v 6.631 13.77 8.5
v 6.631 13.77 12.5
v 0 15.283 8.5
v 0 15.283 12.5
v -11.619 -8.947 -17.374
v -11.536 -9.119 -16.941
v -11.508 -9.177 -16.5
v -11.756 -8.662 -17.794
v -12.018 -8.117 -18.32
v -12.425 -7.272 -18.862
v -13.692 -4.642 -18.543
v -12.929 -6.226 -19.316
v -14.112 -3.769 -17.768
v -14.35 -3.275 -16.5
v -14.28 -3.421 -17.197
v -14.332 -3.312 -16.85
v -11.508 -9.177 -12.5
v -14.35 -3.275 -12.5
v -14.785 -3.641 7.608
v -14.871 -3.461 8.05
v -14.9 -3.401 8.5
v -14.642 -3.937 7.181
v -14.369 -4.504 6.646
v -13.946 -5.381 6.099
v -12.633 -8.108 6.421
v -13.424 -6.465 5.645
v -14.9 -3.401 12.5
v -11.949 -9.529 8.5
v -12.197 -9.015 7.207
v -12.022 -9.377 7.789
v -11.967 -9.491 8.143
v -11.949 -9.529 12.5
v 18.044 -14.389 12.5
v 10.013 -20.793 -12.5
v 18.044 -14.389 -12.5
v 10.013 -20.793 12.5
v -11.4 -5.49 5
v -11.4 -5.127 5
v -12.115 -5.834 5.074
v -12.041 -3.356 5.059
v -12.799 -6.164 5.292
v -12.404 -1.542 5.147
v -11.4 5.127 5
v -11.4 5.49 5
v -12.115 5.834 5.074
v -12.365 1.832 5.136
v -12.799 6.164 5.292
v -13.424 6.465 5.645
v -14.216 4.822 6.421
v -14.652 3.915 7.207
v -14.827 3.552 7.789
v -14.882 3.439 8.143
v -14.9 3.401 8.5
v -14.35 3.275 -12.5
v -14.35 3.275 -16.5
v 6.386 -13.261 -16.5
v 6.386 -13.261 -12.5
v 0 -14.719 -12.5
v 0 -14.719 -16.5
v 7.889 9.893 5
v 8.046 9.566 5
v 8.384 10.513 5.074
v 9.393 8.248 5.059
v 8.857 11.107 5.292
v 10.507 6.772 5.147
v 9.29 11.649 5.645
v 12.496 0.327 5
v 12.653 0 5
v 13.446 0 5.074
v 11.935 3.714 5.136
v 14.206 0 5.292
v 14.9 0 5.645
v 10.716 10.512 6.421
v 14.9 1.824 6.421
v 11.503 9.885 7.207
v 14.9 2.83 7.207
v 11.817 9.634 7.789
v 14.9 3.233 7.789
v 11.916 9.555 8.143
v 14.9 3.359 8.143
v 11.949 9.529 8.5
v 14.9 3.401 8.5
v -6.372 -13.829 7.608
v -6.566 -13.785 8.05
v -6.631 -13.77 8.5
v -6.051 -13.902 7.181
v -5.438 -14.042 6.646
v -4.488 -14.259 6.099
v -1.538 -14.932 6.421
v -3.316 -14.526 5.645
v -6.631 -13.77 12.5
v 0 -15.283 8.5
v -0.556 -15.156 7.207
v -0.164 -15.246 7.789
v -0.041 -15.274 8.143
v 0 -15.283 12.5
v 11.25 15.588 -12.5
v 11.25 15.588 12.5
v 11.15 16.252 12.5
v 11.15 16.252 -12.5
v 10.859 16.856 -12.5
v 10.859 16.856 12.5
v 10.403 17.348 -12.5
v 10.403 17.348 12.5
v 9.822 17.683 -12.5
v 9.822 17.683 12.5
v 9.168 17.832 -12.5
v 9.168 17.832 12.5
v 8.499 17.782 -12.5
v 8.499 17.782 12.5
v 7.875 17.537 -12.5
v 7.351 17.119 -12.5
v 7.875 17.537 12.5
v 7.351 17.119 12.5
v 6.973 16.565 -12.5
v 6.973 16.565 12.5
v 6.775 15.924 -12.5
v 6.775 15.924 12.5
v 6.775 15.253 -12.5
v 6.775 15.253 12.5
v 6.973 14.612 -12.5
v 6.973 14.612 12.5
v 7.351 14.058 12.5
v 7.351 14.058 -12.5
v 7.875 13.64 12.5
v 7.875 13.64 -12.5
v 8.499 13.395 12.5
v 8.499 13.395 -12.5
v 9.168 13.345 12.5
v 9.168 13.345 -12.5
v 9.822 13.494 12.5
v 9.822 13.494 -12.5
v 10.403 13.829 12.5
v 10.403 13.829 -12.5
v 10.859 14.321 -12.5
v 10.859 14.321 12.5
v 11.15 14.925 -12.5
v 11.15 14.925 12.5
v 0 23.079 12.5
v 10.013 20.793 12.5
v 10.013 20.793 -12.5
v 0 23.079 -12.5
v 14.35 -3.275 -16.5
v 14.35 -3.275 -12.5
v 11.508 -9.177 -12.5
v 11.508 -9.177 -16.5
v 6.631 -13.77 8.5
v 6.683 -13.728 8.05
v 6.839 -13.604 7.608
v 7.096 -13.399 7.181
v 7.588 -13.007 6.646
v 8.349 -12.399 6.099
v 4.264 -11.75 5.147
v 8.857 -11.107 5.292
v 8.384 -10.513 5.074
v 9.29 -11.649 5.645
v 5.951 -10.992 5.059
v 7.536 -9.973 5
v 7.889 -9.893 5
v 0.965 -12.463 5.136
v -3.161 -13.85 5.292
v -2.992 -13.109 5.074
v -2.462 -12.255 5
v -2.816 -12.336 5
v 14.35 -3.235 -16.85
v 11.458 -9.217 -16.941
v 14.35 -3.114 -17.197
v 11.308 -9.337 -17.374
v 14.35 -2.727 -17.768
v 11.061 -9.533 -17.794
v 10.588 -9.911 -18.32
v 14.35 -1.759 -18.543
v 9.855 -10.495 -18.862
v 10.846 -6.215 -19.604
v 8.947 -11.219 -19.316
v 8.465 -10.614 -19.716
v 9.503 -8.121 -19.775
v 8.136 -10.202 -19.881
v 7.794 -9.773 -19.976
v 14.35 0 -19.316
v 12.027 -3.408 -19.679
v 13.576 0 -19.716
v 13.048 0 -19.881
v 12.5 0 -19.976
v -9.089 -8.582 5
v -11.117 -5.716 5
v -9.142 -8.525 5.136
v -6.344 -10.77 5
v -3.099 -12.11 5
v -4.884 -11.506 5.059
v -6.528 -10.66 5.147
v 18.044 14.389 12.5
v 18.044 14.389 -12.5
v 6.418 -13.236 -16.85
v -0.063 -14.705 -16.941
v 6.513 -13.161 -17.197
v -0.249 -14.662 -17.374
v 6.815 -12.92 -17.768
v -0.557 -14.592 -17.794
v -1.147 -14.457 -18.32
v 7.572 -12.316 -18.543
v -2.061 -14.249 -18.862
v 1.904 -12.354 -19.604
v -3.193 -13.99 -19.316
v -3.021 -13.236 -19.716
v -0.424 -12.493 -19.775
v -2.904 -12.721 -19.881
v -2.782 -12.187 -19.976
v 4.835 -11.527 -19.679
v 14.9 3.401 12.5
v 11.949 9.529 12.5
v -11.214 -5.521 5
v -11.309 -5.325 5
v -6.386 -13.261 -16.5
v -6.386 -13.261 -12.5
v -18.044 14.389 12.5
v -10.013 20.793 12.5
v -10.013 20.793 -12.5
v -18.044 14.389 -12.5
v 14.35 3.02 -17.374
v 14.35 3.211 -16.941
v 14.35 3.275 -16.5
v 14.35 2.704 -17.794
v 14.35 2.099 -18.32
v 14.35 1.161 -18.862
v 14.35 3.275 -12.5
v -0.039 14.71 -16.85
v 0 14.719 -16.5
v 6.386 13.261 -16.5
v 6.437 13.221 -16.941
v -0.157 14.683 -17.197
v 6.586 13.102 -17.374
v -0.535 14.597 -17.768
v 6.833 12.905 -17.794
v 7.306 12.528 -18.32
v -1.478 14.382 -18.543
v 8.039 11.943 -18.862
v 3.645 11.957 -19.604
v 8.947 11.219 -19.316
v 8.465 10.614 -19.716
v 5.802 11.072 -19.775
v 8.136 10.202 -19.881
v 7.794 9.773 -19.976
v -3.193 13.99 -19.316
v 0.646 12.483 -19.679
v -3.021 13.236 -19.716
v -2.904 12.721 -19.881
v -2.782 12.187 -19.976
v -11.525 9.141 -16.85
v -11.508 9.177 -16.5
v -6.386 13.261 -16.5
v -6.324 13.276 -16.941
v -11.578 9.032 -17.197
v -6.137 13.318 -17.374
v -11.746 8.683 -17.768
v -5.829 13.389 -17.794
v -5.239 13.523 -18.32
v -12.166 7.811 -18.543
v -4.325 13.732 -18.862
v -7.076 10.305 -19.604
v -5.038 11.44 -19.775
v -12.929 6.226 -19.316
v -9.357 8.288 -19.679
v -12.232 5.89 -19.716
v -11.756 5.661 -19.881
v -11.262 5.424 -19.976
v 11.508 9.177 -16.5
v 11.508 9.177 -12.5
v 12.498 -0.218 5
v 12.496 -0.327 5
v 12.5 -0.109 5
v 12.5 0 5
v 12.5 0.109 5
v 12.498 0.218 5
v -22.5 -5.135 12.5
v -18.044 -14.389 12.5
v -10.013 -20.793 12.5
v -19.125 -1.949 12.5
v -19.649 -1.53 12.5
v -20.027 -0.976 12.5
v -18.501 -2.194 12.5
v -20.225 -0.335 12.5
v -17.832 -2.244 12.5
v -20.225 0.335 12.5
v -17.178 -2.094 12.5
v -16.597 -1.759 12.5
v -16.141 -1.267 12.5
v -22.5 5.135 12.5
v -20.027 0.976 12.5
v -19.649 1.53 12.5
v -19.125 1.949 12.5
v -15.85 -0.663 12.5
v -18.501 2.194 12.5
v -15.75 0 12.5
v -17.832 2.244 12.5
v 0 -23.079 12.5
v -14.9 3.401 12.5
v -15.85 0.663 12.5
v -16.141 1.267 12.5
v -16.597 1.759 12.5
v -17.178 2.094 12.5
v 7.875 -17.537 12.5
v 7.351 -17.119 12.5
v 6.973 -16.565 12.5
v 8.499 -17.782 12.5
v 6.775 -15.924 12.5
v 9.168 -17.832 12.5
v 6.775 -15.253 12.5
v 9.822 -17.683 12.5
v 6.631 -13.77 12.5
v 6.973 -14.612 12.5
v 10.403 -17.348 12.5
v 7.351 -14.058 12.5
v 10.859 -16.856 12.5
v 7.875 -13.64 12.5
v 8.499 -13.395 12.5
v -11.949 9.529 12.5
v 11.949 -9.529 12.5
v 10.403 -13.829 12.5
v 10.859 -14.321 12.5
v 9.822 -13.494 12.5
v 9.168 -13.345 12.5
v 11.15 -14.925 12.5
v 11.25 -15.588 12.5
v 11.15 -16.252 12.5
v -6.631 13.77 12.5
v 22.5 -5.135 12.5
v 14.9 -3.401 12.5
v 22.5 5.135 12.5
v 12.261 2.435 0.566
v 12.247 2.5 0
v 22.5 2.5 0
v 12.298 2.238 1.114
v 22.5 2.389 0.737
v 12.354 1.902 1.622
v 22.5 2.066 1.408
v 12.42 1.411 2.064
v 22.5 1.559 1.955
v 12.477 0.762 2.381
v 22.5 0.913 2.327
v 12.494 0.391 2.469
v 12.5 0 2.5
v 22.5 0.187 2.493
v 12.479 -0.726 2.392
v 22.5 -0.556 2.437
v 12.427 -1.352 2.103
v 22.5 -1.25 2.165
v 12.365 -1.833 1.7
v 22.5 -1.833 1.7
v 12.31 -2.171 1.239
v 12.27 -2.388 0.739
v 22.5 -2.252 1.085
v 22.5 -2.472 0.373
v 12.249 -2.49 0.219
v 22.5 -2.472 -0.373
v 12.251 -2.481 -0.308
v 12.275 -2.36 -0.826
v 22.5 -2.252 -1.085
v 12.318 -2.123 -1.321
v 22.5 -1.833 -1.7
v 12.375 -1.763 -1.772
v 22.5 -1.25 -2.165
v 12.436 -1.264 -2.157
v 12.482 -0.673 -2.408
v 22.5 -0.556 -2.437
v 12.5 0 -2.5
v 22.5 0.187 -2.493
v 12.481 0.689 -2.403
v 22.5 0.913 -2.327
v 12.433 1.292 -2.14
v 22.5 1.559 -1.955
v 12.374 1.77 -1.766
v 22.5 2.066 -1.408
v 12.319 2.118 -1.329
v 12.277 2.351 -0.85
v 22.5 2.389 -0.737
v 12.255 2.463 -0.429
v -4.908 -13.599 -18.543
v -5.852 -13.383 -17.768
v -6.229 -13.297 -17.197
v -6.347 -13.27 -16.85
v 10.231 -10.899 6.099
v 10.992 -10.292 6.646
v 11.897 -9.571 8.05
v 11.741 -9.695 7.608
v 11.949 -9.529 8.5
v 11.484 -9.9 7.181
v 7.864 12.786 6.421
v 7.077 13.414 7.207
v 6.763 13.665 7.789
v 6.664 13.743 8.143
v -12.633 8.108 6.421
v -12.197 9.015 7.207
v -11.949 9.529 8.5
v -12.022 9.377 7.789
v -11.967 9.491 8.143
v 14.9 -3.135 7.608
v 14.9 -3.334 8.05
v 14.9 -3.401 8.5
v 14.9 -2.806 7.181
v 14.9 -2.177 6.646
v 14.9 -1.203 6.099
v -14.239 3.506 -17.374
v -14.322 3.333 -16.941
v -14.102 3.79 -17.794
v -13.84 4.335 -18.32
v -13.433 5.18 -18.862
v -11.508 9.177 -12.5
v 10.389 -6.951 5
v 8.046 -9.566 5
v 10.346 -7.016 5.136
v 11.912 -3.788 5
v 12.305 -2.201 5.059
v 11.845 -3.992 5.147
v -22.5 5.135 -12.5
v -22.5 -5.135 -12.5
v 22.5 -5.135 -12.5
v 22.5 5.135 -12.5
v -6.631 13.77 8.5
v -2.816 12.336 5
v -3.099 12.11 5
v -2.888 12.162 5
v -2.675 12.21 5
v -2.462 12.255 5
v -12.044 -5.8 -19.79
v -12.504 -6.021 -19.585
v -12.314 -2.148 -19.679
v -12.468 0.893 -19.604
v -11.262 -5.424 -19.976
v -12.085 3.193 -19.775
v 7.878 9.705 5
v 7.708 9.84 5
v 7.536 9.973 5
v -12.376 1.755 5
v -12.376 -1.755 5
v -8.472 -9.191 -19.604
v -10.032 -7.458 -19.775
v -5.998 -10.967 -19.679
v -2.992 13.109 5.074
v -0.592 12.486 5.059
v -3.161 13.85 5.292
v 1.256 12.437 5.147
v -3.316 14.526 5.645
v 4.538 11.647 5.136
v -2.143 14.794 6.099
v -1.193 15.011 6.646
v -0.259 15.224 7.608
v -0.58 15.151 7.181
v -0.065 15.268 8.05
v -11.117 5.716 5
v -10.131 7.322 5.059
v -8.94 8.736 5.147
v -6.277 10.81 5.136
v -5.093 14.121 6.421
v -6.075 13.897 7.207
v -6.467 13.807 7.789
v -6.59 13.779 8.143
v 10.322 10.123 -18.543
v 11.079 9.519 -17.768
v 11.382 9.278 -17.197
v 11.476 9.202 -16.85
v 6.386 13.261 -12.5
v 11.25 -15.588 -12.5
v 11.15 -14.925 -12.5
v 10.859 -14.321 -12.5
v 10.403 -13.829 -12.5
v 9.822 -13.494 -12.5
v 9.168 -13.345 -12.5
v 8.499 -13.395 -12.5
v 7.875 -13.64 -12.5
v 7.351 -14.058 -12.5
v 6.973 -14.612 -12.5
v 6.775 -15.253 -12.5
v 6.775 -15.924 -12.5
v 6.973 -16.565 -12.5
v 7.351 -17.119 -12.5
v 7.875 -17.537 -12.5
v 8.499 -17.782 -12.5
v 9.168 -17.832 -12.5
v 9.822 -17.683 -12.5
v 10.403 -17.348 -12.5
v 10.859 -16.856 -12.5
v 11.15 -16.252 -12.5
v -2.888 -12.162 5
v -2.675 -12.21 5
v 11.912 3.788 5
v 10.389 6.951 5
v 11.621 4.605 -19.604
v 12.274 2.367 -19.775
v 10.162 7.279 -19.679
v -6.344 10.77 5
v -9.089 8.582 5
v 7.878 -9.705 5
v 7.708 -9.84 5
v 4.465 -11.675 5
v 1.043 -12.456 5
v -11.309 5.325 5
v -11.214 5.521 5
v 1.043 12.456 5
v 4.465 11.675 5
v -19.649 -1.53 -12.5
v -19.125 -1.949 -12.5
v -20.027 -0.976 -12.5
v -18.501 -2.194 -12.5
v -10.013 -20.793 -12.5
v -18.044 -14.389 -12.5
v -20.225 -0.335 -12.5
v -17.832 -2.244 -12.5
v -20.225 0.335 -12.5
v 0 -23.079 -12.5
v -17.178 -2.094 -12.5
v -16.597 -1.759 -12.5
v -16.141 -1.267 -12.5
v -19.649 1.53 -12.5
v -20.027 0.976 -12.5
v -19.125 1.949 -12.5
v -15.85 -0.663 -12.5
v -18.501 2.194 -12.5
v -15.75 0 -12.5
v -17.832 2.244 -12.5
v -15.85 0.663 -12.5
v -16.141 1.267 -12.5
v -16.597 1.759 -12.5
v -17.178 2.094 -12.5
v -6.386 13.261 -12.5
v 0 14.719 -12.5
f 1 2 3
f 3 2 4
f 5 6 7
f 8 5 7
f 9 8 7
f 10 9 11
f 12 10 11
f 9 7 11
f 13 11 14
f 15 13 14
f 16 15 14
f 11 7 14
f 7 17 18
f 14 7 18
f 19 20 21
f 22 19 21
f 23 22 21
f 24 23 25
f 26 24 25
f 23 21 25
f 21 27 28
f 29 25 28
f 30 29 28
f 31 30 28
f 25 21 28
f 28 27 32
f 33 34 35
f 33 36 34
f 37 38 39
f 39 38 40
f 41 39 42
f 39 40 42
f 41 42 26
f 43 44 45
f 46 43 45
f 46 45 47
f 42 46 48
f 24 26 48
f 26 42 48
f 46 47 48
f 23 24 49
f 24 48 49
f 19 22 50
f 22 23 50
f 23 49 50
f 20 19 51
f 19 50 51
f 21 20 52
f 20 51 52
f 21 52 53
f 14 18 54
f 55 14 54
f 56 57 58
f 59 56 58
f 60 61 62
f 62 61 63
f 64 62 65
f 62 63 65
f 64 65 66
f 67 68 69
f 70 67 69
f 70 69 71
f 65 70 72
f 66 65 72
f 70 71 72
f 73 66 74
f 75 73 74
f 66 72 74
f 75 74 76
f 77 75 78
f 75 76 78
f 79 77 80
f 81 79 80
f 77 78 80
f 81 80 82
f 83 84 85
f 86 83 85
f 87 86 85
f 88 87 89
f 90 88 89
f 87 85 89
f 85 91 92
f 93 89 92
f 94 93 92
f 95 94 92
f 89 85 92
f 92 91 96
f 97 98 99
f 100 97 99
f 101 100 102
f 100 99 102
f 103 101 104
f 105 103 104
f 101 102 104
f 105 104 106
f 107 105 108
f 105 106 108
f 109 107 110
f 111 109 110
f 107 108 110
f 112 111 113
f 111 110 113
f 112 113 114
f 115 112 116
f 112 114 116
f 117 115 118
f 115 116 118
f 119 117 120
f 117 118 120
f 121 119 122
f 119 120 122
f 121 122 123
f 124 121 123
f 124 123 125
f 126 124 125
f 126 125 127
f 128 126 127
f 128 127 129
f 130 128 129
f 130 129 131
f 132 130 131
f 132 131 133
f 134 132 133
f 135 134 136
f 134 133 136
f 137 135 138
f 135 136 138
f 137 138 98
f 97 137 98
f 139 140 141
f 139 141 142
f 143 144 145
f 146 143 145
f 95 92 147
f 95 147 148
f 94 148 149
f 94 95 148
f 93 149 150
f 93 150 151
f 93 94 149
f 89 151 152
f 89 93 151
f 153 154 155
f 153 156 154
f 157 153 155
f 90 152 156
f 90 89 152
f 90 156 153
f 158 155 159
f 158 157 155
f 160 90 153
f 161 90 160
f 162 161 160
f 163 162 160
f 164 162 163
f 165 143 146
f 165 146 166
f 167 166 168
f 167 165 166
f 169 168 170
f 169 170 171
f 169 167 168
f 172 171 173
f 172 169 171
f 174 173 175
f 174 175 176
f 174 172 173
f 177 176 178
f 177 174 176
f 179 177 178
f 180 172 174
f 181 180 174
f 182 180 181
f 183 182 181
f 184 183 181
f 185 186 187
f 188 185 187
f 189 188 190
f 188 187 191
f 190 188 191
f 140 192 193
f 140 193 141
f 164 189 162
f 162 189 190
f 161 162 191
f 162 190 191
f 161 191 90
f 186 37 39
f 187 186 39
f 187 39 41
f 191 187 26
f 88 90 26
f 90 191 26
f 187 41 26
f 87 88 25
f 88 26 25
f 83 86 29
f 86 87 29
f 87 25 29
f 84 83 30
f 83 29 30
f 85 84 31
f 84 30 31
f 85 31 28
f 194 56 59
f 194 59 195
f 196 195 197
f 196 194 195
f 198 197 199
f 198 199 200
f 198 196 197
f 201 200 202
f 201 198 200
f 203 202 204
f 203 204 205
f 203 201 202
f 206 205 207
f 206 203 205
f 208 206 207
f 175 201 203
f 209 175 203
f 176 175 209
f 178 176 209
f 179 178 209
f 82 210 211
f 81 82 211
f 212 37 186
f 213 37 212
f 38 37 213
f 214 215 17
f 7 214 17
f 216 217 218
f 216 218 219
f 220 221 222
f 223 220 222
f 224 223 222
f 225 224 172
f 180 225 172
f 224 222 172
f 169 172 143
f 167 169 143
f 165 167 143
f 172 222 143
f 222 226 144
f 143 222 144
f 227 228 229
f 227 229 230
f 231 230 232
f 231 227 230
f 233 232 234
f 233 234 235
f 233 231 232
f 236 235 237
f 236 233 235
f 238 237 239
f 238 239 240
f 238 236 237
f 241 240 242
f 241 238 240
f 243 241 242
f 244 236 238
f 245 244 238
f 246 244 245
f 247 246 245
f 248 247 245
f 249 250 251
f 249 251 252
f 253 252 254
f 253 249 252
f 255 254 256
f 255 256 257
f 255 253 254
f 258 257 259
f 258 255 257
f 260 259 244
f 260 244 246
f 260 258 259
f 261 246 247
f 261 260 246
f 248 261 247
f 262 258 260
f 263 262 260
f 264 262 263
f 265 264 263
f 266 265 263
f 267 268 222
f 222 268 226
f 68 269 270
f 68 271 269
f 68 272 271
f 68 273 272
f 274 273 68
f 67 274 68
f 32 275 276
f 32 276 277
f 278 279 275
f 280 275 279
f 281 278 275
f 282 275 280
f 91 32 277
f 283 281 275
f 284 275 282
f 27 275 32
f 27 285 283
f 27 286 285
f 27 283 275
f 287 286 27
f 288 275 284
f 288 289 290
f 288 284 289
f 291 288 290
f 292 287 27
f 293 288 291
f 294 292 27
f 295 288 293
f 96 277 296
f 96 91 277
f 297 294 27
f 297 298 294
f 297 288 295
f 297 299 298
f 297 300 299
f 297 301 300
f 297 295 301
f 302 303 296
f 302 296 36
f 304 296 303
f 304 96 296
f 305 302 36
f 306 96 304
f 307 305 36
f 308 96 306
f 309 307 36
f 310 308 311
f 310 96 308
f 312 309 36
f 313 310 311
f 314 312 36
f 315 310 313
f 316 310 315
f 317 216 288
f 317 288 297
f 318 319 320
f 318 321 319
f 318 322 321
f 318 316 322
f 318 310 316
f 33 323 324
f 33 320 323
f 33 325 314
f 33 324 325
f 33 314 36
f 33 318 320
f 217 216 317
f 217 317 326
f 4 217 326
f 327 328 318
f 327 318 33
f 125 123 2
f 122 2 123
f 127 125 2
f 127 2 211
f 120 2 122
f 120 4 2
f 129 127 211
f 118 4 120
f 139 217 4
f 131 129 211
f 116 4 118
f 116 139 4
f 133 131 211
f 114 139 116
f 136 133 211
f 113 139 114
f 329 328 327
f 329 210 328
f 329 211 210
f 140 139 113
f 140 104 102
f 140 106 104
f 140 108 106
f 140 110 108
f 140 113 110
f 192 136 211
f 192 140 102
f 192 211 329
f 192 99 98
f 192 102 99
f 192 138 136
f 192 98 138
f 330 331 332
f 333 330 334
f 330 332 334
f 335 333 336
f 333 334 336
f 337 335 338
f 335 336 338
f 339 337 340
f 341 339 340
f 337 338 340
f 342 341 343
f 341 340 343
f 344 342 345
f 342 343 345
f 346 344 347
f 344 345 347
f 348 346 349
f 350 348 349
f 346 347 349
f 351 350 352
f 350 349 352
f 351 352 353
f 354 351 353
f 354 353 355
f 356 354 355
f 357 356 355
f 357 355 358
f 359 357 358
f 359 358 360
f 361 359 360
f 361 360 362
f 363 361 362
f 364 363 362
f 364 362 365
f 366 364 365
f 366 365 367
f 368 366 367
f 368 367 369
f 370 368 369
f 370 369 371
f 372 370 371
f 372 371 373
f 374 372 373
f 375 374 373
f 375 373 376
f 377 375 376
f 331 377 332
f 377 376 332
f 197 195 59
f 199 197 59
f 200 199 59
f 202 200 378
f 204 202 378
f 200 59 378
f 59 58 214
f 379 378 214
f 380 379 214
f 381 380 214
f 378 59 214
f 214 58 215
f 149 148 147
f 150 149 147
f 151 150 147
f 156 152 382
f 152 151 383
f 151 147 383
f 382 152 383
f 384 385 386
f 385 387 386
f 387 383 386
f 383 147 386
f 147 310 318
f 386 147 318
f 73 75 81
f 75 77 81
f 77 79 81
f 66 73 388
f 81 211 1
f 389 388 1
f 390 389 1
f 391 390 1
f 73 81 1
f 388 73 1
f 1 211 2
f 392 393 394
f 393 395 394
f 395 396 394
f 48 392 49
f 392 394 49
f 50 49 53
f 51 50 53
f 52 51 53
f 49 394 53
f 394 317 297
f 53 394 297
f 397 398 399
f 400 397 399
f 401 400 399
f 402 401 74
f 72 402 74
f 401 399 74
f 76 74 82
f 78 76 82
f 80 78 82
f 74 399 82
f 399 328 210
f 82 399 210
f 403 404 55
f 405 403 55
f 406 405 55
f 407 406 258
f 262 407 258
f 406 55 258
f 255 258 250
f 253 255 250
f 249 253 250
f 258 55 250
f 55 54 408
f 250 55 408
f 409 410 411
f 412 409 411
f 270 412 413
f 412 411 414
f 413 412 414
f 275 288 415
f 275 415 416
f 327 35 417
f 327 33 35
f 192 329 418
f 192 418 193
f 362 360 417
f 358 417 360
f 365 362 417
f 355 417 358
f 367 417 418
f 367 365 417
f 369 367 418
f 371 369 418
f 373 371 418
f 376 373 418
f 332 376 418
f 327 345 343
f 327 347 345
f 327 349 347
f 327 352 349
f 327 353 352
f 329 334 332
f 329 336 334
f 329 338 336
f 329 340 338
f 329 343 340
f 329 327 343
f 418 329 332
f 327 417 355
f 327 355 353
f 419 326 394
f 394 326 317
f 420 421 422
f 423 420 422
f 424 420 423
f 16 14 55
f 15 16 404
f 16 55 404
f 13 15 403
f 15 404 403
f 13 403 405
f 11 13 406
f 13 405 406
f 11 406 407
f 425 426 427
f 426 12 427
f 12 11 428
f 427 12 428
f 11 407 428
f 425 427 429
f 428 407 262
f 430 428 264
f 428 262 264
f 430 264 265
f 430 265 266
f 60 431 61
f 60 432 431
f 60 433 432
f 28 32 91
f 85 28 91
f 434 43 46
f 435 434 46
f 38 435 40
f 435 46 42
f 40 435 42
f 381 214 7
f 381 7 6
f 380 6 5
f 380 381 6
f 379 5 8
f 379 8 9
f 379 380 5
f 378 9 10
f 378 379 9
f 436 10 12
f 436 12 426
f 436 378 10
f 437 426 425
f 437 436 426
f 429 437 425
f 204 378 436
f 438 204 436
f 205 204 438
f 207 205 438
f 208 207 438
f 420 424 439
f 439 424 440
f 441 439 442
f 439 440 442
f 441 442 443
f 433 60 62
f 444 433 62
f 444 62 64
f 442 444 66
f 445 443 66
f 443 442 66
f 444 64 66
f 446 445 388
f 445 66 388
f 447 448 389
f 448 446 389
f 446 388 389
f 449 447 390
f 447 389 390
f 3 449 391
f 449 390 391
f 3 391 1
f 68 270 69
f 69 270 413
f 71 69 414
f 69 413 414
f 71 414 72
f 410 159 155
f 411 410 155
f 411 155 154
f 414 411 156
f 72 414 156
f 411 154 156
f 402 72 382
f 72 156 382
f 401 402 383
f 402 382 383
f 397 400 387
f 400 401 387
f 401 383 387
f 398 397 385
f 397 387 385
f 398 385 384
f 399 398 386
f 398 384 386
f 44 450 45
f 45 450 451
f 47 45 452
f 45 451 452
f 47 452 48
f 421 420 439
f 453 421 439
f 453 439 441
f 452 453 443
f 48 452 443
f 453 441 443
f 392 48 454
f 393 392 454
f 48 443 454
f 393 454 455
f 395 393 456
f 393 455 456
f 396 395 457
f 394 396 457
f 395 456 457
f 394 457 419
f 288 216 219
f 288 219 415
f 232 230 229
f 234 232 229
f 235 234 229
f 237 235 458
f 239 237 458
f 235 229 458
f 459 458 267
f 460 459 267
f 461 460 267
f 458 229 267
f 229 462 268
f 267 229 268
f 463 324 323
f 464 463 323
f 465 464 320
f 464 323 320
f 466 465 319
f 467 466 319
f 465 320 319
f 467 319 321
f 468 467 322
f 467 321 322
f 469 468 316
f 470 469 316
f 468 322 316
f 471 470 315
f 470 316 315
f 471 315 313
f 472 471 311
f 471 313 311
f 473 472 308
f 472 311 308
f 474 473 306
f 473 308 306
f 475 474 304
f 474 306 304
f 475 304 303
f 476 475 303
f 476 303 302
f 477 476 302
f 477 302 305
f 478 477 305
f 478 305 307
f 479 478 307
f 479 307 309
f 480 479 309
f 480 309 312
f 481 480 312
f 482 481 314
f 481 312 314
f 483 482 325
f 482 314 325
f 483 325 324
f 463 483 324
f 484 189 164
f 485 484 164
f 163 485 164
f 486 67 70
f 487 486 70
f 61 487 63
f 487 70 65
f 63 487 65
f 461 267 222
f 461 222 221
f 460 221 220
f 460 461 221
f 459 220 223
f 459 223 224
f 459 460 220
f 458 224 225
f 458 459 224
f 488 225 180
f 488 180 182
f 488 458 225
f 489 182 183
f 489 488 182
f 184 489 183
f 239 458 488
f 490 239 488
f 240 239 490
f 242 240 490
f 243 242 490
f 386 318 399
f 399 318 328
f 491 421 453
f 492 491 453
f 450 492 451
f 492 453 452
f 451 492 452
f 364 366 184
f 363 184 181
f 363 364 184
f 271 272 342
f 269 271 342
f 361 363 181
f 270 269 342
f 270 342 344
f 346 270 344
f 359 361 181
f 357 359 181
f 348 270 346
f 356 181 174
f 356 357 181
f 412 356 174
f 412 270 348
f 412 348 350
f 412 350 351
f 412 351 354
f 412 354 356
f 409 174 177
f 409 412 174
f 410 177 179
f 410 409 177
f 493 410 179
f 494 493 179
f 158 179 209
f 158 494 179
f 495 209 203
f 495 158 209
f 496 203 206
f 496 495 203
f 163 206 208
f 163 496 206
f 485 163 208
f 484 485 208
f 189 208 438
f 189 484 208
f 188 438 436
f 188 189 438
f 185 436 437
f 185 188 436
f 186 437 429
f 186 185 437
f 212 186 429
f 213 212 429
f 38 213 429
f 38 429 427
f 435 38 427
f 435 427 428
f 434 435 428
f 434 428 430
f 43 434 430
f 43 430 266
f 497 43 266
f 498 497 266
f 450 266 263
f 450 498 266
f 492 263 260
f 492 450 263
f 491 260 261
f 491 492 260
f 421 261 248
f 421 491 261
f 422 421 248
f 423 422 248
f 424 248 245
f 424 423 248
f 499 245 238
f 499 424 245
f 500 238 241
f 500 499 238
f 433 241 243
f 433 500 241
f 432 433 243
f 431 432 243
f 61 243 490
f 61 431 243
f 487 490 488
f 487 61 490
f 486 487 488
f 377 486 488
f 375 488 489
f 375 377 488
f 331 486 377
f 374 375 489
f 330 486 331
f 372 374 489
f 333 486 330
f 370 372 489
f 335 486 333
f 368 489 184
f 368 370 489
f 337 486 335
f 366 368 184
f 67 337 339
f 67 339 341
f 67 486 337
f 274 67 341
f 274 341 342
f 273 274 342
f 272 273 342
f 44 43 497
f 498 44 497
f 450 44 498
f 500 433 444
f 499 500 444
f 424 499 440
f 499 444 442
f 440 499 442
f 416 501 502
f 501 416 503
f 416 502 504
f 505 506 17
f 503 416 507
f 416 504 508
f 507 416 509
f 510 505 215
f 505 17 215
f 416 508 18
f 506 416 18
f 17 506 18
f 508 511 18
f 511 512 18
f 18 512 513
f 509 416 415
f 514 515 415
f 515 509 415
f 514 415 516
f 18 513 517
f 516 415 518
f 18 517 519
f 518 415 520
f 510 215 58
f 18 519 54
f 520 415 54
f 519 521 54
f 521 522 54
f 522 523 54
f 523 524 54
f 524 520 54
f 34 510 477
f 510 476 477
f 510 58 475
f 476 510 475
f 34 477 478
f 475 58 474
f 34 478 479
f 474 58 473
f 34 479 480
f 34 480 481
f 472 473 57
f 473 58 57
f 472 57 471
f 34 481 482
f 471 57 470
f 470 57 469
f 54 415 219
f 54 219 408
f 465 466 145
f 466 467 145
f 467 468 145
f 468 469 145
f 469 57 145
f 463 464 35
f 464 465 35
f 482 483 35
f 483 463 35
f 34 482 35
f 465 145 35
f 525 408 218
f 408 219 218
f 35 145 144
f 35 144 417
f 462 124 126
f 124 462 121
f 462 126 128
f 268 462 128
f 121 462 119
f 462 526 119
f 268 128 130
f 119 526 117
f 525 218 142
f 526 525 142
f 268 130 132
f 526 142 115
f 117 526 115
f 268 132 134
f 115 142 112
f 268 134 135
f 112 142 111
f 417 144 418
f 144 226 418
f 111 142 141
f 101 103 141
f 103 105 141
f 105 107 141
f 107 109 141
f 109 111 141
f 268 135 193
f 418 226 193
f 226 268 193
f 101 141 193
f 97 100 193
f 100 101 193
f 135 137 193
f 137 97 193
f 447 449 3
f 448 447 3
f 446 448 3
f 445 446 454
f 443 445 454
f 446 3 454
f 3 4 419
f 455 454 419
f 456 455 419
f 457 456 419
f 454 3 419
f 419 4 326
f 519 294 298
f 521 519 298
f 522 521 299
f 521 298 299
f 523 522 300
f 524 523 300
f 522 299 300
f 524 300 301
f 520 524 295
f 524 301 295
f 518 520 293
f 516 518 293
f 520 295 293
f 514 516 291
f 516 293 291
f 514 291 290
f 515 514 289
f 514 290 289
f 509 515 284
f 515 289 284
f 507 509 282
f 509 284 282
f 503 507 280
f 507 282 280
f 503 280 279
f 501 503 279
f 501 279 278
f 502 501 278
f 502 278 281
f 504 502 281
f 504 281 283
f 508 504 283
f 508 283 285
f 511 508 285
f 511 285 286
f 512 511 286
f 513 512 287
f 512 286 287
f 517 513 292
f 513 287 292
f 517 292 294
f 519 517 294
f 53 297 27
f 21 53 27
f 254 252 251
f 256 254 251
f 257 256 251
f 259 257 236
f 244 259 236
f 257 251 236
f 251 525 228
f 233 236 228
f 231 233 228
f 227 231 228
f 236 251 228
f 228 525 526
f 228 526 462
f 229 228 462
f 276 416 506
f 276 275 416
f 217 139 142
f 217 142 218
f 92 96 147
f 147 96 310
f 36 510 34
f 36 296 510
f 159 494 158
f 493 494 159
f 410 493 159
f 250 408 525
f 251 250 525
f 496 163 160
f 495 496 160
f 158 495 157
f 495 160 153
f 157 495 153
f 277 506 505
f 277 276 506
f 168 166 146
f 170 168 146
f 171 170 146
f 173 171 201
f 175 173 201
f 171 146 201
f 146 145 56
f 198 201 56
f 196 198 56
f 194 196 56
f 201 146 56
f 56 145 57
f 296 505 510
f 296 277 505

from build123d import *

# Parameters (mm, degrees)
F0_R         = 12.5
F1_DEPTH     = 12.5
F2_R         = 2.25
F3_DEPTH     = 25
F4_R         = 12.5
F5_DEPTH     = 7.5
F6_R         = 12.5
F7_DEPTH     = 7.5
F8_T4_DEPTH  = 24.3016555368
F8_S5_R      = 12.5
F8_T6_DEPTH  = 15
F8_T11_DEPTH = 24.3016555368
F8_S12_R     = 12.5
F8_T13_DEPTH = 14
F8_T17_DEPTH = 24.3016555368
F8_S18_R     = 12.5
F8_T19_DEPTH = 15
F8_T24_DEPTH = 24.3016555368
F8_S25_R     = 12.5
F8_T26_DEPTH = 15
F8_T30_DEPTH = 24.3016555368
F8_S31_R     = 12.5
F8_T32_DEPTH = 15
F8_T37_DEPTH = 24.3016555368
F8_S38_R     = 12.5
F8_T39_DEPTH = 15
F8_T44_DEPTH = 24.3016555368
F8_S45_R     = 12.5
F8_T46_DEPTH = 15
F9_T1_DEPTH  = 24.050587715
F9_T3_DEPTH  = 24.050587715
F9_T5_DEPTH  = 24.050587715
F9_T7_DEPTH  = 24.050587715
F9_T9_DEPTH  = 24.050587715
F9_T11_DEPTH = 24.050587715
F9_T13_DEPTH = 24.050587715
F10_R        = 2.5
F11_DEPTH    = 12


# Not quite as in the source:
# - a fillet or chamfer that OpenCascade refuses, or shapes differently, is made with other operations: its cross-section is extruded or revolved along the edge and cut away or added


with BuildPart() as f1:
    # F0 (on Top) → F1 (new body, symmetric)
    with BuildSketch(Plane.XY):
        Polygon((22.5, -5.1354781738), (22.5, 5.1354781738), (18.0435990556, 14.3892900865), (10.013442028, 20.7931266245), (0, 23.0786294236), (-10.013442028, 20.7931266245), (-18.0435990556, 14.3892900865), (-22.5, 5.1354781738), (-22.5, -5.1354781738), (-18.0435990556, -14.3892900865), (-10.013442028, -20.7931266245), (0, -23.0786294236), (10.013442028, -20.7931266245), (18.0435990556, -14.3892900865), align=None)
        Circle(F0_R, mode=Mode.SUBTRACT)
    extrude(amount=F1_DEPTH, both=True)

    # F2 (on face) → F3 (cut)
    with BuildSketch(Plane.XY.offset(12.5)):
        with Locations((9, 15.5884572681)):
            Circle(F2_R)
        with Locations((-18, 0)):
            Circle(F2_R)
        with Locations((9, -15.5884572681)):
            Circle(F2_R)
    extrude(amount=-F3_DEPTH, mode=Mode.SUBTRACT)

    # F4 (on face) → F5 (cut)
    with BuildSketch(Plane.XY.offset(12.5)):
        Polygon((14.9, -3.4008277684), (14.9, 3.4008277684), (11.9488722635, 9.5289076573), (6.6311238319, 13.7696705203), (0, 15.2831812628), (-6.6311238319, 13.7696705203), (-11.9488722635, 9.5289076573), (-14.9, 3.4008277684), (-14.9, -3.4008277684), (-11.9488722635, -9.5289076573), (-6.6311238319, -13.7696705203), (0, -15.2831812628), (6.6311238319, -13.7696705203), (11.9488722635, -9.5289076573), align=None)
        Circle(F4_R, mode=Mode.SUBTRACT)
    extrude(amount=-F5_DEPTH, mode=Mode.SUBTRACT)

    # F6 (on face) → F7 (join)
    with BuildSketch(Plane(origin=(0, 0, -12.5), x_dir=(1, 0, 0), z_dir=(0, 0, -1))):
        Polygon((14.35, -3.2752938575), (14.35, 3.2752938575), (11.5078065088, 9.1771694552), (6.3863508045, 13.2613940917), (0, 14.719036988), (-6.3863508045, 13.2613940917), (-11.5078065088, 9.1771694552), (-14.35, 3.2752938575), (-14.35, -3.2752938575), (-11.5078065088, -9.1771694552), (-6.3863508045, -13.2613940917), (0, -14.719036988), (6.3863508045, -13.2613940917), (11.5078065088, -9.1771694552), align=None)
        Circle(F6_R, mode=Mode.SUBTRACT)
    extrude(amount=F7_DEPTH)

    # F8: fillet of radius 3.5 on 7 edges, made by hand


with BuildPart() as f8_tool2:
    # F8_s3 → F8_t4 (new body)
    with BuildSketch(Plane(origin=(9.4998996874, 7.5759171977, 0), x_dir=(0, 0, 1), z_dir=(-0.7818314825, -0.6234898019, 0))):
        with BuildLine():
            ThreePointArc((5, 11.4), (6.0251262658, 13.8748737342), (8.5, 14.9))
            Line((8.5, 14.9), (5, 14.9))
            Line((5, 14.9), (5, 11.4))
        make_face()
    extrude(amount=F8_T4_DEPTH)

    # F8_s5 → F8_t6 (cut, symmetric)
    with BuildSketch(Plane.XY.offset(6.8)):
        Circle(F8_S5_R)
    extrude(amount=F8_T6_DEPTH, both=True, mode=Mode.SUBTRACT)

    split(bisect_by=Plane(origin=(-13.4244361317, 6.4648677129, 0), x_dir=(0, 0, 1), z_dir=(0.9009688679, -0.4338837391, 0)), keep=Keep.TOP)


with BuildPart() as f1_1:
    add(f1.part)

    # F8_t1: union F8_tool2
    add(f8_tool2.part)


with BuildPart() as f8_tool9:
    # F8_s10 → F8_t11 (new body)
    with BuildSketch(Plane.XZ.offset(-12.1508277684)):
        with BuildLine():
            ThreePointArc((-11.4, 5), (-13.8748737342, 6.0251262658), (-14.9, 8.5))
            Line((-14.9, 8.5), (-14.9, 5))
            Line((-14.9, 5), (-11.4, 5))
        make_face()
    extrude(amount=F8_T11_DEPTH)

    # F8_s12 → F8_t13 (cut, symmetric)
    with BuildSketch(Plane.XY.offset(6.8)):
        Circle(F8_S12_R)
    extrude(amount=F8_T13_DEPTH, both=True, mode=Mode.SUBTRACT)


with BuildPart() as f1_2:
    add(f1_1.part)

    # F8_t8: union F8_tool9
    add(f8_tool9.part)


with BuildPart() as f8_tool15:
    # F8_s16 → F8_t17 (new body)
    with BuildSketch(Plane(origin=(-9.4998996874, 7.5759171977, 0), x_dir=(0, 0, 1), z_dir=(0.7818314825, -0.6234898019, 0))):
        with BuildLine():
            ThreePointArc((5, 11.4), (6.0251262658, 13.8748737342), (8.5, 14.9))
            Line((8.5, 14.9), (5, 14.9))
            Line((5, 14.9), (5, 11.4))
        make_face()
    extrude(amount=F8_T17_DEPTH)

    # F8_s18 → F8_t19 (cut, symmetric)
    with BuildSketch(Plane.XY.offset(6.8)):
        Circle(F8_S18_R)
    extrude(amount=F8_T19_DEPTH, both=True, mode=Mode.SUBTRACT)

    split(bisect_by=Plane.YZ.offset(-14.9), keep=Keep.TOP)


with BuildPart() as f1_3:
    add(f1_2.part)

    # F8_t14: union F8_tool15
    add(f8_tool15.part)


with BuildPart() as f8_tool22:
    # F8_s23 → F8_t24 (new body)
    with BuildSketch(Plane(origin=(-11.8461811475, -2.7038135434, 0), x_dir=(0, 0, 1), z_dir=(0.9749279122, 0.222520934, 0))):
        with BuildLine():
            ThreePointArc((8.5, 14.9), (6.0251262658, 13.8748737342), (5, 11.4))
            Line((5, 11.4), (5, 14.9))
            Line((5, 14.9), (8.5, 14.9))
        make_face()
    extrude(amount=F8_T24_DEPTH)

    # F8_s25 → F8_t26 (cut, symmetric)
    with BuildSketch(Plane.XY.offset(6.8)):
        Circle(F8_S25_R)
    extrude(amount=F8_T26_DEPTH, both=True, mode=Mode.SUBTRACT)


with BuildPart() as f1_4:
    add(f1_3.part)

    # F8_t21: union F8_tool22
    add(f8_tool22.part)


with BuildPart() as f8_tool28:
    # F8_s29 → F8_t30 (new body)
    with BuildSketch(Plane(origin=(-5.2720465855, -10.9475175386, 0), x_dir=(0, 0, 1), z_dir=(0.4338837391, 0.9009688679, 0))):
        with BuildLine():
            ThreePointArc((5, 11.4), (6.0251262658, 13.8748737342), (8.5, 14.9))
            Line((8.5, 14.9), (5, 14.9))
            Line((5, 14.9), (5, 11.4))
        make_face()
    extrude(amount=F8_T30_DEPTH)

    # F8_s31 → F8_t32 (cut, symmetric)
    with BuildSketch(Plane.XY.offset(6.8)):
        Circle(F8_S31_R)
    extrude(amount=F8_T32_DEPTH, both=True, mode=Mode.SUBTRACT)

    split(bisect_by=Plane(origin=(9.2899980477, -11.6492890888, 0), x_dir=(0, 0, 1), z_dir=(-0.6234898019, 0.7818314825, 0)), keep=Keep.TOP)


with BuildPart() as f1_5:
    add(f1_4.part)

    # F8_t27: union F8_tool28
    add(f8_tool28.part)


with BuildPart() as f8_tool35:
    # F8_s36 → F8_t37 (new body)
    with BuildSketch(Plane(origin=(5.2720465855, -10.9475175386, 0), x_dir=(0, 0, 1), z_dir=(-0.4338837391, 0.9009688679, 0))):
        with BuildLine():
            ThreePointArc((5, 11.4), (6.0251262658, 13.8748737342), (8.5, 14.9))
            Line((8.5, 14.9), (5, 14.9))
            Line((5, 14.9), (5, 11.4))
        make_face()
    extrude(amount=F8_T37_DEPTH)

    # F8_s38 → F8_t39 (cut, symmetric)
    with BuildSketch(Plane.XY.offset(6.8)):
        Circle(F8_S38_R)
    extrude(amount=F8_T39_DEPTH, both=True, mode=Mode.SUBTRACT)

    split(bisect_by=Plane(origin=(9.2899980477, 11.6492890888, 0), x_dir=(0, 0, 1), z_dir=(-0.6234898019, -0.7818314825, 0)), keep=Keep.TOP)


with BuildPart() as f1_6:
    add(f1_5.part)

    # F8_t34: union F8_tool35
    add(f8_tool35.part)


with BuildPart() as f8_tool42:
    # F8_s43 → F8_t44 (new body)
    with BuildSketch(Plane(origin=(11.8461811475, -2.7038135434, 0), x_dir=(0, 0, 1), z_dir=(-0.9749279122, 0.222520934, 0))):
        with BuildLine():
            ThreePointArc((5, 11.4), (6.0251262658, 13.8748737342), (8.5, 14.9))
            Line((8.5, 14.9), (5, 14.9))
            Line((5, 14.9), (5, 11.4))
        make_face()
    extrude(amount=F8_T44_DEPTH)

    # F8_s45 → F8_t46 (cut, symmetric)
    with BuildSketch(Plane.XY.offset(6.8)):
        Circle(F8_S45_R)
    extrude(amount=F8_T46_DEPTH, both=True, mode=Mode.SUBTRACT)


with BuildPart() as f1_7:
    add(f1_6.part)

    # F8_t41: union F8_tool42
    add(f8_tool42.part)

    # F9: fillet of radius 3.5 on 7 edges, made by hand

    # F9_s2 → F9_t1 (cut)
    with BuildSketch(Plane(origin=(-5.2175794629, 10.834415393, 0), x_dir=(0, 0, 1), z_dir=(0.4338837391, -0.9009688679, 0))):
        with BuildLine():
            ThreePointArc((-16.5, -14.35), (-18.9748737342, -13.3248737342), (-20, -10.85))
            Line((-20, -10.85), (-20, -14.35))
            Line((-20, -14.35), (-16.5, -14.35))
        make_face()
    extrude(amount=F9_T1_DEPTH, mode=Mode.SUBTRACT)

    # F9_s4 → F9_t3 (cut)
    with BuildSketch(Plane(origin=(-11.7237946339, 2.6758796203, 0), x_dir=(0, 0, 1), z_dir=(0.9749279122, -0.222520934, 0))):
        with BuildLine():
            ThreePointArc((-16.5, -14.35), (-18.9748737342, -13.3248737342), (-20, -10.85))
            Line((-20, -10.85), (-20, -14.35))
            Line((-20, -14.35), (-16.5, -14.35))
        make_face()
    extrude(amount=F9_T3_DEPTH, mode=Mode.SUBTRACT)

    # F9_s6 → F9_t5 (cut)
    with BuildSketch(Plane(origin=(-9.4017533237, -7.4976480845, 0), x_dir=(0, 0, 1), z_dir=(0.7818314825, 0.6234898019, 0))):
        with BuildLine():
            ThreePointArc((-16.5, -14.35), (-18.9748737342, -13.3248737342), (-20, -10.85))
            Line((-20, -10.85), (-20, -14.35))
            Line((-20, -14.35), (-16.5, -14.35))
        make_face()
    extrude(amount=F9_T5_DEPTH, mode=Mode.SUBTRACT)

    # F9_s8 → F9_t7 (cut)
    with BuildSketch(Plane.XZ.offset(-12.0252938575)):
        with BuildLine():
            ThreePointArc((-14.35, -16.5), (-13.3248737342, -18.9748737342), (-10.85, -20))
            Line((-10.85, -20), (-14.35, -20))
            Line((-14.35, -20), (-14.35, -16.5))
        make_face()
    extrude(amount=F9_T7_DEPTH, mode=Mode.SUBTRACT)

    # F9_s10 → F9_t9 (cut)
    with BuildSketch(Plane(origin=(9.4017533237, -7.4976480845, 0), x_dir=(0, 0, 1), z_dir=(-0.7818314825, 0.6234898019, 0))):
        with BuildLine():
            ThreePointArc((-16.5, -14.35), (-18.9748737342, -13.3248737342), (-20, -10.85))
            Line((-20, -10.85), (-20, -14.35))
            Line((-20, -14.35), (-16.5, -14.35))
        make_face()
    extrude(amount=F9_T9_DEPTH, mode=Mode.SUBTRACT)

    # F9_s12 → F9_t11 (cut)
    with BuildSketch(Plane(origin=(11.7237946339, 2.6758796203, 0), x_dir=(0, 0, 1), z_dir=(-0.9749279122, -0.222520934, 0))):
        with BuildLine():
            ThreePointArc((-16.5, -14.35), (-18.9748737342, -13.3248737342), (-20, -10.85))
            Line((-20, -10.85), (-20, -14.35))
            Line((-20, -14.35), (-16.5, -14.35))
        make_face()
    extrude(amount=F9_T11_DEPTH, mode=Mode.SUBTRACT)

    # F9_s14 → F9_t13 (cut)
    with BuildSketch(Plane(origin=(5.2175794629, 10.834415393, 0), x_dir=(0, 0, 1), z_dir=(-0.4338837391, -0.9009688679, 0))):
        with BuildLine():
            ThreePointArc((-16.5, -14.35), (-18.9748737342, -13.3248737342), (-20, -10.85))
            Line((-20, -10.85), (-20, -14.35))
            Line((-20, -14.35), (-16.5, -14.35))
        make_face()
    extrude(amount=F9_T13_DEPTH, mode=Mode.SUBTRACT)

    # F10 (on face) → F11 (cut)
    with BuildSketch(Plane.YZ.offset(22.5)):
        Circle(F10_R)
    extrude(amount=-F11_DEPTH, mode=Mode.SUBTRACT)


solid = f1_7.part
